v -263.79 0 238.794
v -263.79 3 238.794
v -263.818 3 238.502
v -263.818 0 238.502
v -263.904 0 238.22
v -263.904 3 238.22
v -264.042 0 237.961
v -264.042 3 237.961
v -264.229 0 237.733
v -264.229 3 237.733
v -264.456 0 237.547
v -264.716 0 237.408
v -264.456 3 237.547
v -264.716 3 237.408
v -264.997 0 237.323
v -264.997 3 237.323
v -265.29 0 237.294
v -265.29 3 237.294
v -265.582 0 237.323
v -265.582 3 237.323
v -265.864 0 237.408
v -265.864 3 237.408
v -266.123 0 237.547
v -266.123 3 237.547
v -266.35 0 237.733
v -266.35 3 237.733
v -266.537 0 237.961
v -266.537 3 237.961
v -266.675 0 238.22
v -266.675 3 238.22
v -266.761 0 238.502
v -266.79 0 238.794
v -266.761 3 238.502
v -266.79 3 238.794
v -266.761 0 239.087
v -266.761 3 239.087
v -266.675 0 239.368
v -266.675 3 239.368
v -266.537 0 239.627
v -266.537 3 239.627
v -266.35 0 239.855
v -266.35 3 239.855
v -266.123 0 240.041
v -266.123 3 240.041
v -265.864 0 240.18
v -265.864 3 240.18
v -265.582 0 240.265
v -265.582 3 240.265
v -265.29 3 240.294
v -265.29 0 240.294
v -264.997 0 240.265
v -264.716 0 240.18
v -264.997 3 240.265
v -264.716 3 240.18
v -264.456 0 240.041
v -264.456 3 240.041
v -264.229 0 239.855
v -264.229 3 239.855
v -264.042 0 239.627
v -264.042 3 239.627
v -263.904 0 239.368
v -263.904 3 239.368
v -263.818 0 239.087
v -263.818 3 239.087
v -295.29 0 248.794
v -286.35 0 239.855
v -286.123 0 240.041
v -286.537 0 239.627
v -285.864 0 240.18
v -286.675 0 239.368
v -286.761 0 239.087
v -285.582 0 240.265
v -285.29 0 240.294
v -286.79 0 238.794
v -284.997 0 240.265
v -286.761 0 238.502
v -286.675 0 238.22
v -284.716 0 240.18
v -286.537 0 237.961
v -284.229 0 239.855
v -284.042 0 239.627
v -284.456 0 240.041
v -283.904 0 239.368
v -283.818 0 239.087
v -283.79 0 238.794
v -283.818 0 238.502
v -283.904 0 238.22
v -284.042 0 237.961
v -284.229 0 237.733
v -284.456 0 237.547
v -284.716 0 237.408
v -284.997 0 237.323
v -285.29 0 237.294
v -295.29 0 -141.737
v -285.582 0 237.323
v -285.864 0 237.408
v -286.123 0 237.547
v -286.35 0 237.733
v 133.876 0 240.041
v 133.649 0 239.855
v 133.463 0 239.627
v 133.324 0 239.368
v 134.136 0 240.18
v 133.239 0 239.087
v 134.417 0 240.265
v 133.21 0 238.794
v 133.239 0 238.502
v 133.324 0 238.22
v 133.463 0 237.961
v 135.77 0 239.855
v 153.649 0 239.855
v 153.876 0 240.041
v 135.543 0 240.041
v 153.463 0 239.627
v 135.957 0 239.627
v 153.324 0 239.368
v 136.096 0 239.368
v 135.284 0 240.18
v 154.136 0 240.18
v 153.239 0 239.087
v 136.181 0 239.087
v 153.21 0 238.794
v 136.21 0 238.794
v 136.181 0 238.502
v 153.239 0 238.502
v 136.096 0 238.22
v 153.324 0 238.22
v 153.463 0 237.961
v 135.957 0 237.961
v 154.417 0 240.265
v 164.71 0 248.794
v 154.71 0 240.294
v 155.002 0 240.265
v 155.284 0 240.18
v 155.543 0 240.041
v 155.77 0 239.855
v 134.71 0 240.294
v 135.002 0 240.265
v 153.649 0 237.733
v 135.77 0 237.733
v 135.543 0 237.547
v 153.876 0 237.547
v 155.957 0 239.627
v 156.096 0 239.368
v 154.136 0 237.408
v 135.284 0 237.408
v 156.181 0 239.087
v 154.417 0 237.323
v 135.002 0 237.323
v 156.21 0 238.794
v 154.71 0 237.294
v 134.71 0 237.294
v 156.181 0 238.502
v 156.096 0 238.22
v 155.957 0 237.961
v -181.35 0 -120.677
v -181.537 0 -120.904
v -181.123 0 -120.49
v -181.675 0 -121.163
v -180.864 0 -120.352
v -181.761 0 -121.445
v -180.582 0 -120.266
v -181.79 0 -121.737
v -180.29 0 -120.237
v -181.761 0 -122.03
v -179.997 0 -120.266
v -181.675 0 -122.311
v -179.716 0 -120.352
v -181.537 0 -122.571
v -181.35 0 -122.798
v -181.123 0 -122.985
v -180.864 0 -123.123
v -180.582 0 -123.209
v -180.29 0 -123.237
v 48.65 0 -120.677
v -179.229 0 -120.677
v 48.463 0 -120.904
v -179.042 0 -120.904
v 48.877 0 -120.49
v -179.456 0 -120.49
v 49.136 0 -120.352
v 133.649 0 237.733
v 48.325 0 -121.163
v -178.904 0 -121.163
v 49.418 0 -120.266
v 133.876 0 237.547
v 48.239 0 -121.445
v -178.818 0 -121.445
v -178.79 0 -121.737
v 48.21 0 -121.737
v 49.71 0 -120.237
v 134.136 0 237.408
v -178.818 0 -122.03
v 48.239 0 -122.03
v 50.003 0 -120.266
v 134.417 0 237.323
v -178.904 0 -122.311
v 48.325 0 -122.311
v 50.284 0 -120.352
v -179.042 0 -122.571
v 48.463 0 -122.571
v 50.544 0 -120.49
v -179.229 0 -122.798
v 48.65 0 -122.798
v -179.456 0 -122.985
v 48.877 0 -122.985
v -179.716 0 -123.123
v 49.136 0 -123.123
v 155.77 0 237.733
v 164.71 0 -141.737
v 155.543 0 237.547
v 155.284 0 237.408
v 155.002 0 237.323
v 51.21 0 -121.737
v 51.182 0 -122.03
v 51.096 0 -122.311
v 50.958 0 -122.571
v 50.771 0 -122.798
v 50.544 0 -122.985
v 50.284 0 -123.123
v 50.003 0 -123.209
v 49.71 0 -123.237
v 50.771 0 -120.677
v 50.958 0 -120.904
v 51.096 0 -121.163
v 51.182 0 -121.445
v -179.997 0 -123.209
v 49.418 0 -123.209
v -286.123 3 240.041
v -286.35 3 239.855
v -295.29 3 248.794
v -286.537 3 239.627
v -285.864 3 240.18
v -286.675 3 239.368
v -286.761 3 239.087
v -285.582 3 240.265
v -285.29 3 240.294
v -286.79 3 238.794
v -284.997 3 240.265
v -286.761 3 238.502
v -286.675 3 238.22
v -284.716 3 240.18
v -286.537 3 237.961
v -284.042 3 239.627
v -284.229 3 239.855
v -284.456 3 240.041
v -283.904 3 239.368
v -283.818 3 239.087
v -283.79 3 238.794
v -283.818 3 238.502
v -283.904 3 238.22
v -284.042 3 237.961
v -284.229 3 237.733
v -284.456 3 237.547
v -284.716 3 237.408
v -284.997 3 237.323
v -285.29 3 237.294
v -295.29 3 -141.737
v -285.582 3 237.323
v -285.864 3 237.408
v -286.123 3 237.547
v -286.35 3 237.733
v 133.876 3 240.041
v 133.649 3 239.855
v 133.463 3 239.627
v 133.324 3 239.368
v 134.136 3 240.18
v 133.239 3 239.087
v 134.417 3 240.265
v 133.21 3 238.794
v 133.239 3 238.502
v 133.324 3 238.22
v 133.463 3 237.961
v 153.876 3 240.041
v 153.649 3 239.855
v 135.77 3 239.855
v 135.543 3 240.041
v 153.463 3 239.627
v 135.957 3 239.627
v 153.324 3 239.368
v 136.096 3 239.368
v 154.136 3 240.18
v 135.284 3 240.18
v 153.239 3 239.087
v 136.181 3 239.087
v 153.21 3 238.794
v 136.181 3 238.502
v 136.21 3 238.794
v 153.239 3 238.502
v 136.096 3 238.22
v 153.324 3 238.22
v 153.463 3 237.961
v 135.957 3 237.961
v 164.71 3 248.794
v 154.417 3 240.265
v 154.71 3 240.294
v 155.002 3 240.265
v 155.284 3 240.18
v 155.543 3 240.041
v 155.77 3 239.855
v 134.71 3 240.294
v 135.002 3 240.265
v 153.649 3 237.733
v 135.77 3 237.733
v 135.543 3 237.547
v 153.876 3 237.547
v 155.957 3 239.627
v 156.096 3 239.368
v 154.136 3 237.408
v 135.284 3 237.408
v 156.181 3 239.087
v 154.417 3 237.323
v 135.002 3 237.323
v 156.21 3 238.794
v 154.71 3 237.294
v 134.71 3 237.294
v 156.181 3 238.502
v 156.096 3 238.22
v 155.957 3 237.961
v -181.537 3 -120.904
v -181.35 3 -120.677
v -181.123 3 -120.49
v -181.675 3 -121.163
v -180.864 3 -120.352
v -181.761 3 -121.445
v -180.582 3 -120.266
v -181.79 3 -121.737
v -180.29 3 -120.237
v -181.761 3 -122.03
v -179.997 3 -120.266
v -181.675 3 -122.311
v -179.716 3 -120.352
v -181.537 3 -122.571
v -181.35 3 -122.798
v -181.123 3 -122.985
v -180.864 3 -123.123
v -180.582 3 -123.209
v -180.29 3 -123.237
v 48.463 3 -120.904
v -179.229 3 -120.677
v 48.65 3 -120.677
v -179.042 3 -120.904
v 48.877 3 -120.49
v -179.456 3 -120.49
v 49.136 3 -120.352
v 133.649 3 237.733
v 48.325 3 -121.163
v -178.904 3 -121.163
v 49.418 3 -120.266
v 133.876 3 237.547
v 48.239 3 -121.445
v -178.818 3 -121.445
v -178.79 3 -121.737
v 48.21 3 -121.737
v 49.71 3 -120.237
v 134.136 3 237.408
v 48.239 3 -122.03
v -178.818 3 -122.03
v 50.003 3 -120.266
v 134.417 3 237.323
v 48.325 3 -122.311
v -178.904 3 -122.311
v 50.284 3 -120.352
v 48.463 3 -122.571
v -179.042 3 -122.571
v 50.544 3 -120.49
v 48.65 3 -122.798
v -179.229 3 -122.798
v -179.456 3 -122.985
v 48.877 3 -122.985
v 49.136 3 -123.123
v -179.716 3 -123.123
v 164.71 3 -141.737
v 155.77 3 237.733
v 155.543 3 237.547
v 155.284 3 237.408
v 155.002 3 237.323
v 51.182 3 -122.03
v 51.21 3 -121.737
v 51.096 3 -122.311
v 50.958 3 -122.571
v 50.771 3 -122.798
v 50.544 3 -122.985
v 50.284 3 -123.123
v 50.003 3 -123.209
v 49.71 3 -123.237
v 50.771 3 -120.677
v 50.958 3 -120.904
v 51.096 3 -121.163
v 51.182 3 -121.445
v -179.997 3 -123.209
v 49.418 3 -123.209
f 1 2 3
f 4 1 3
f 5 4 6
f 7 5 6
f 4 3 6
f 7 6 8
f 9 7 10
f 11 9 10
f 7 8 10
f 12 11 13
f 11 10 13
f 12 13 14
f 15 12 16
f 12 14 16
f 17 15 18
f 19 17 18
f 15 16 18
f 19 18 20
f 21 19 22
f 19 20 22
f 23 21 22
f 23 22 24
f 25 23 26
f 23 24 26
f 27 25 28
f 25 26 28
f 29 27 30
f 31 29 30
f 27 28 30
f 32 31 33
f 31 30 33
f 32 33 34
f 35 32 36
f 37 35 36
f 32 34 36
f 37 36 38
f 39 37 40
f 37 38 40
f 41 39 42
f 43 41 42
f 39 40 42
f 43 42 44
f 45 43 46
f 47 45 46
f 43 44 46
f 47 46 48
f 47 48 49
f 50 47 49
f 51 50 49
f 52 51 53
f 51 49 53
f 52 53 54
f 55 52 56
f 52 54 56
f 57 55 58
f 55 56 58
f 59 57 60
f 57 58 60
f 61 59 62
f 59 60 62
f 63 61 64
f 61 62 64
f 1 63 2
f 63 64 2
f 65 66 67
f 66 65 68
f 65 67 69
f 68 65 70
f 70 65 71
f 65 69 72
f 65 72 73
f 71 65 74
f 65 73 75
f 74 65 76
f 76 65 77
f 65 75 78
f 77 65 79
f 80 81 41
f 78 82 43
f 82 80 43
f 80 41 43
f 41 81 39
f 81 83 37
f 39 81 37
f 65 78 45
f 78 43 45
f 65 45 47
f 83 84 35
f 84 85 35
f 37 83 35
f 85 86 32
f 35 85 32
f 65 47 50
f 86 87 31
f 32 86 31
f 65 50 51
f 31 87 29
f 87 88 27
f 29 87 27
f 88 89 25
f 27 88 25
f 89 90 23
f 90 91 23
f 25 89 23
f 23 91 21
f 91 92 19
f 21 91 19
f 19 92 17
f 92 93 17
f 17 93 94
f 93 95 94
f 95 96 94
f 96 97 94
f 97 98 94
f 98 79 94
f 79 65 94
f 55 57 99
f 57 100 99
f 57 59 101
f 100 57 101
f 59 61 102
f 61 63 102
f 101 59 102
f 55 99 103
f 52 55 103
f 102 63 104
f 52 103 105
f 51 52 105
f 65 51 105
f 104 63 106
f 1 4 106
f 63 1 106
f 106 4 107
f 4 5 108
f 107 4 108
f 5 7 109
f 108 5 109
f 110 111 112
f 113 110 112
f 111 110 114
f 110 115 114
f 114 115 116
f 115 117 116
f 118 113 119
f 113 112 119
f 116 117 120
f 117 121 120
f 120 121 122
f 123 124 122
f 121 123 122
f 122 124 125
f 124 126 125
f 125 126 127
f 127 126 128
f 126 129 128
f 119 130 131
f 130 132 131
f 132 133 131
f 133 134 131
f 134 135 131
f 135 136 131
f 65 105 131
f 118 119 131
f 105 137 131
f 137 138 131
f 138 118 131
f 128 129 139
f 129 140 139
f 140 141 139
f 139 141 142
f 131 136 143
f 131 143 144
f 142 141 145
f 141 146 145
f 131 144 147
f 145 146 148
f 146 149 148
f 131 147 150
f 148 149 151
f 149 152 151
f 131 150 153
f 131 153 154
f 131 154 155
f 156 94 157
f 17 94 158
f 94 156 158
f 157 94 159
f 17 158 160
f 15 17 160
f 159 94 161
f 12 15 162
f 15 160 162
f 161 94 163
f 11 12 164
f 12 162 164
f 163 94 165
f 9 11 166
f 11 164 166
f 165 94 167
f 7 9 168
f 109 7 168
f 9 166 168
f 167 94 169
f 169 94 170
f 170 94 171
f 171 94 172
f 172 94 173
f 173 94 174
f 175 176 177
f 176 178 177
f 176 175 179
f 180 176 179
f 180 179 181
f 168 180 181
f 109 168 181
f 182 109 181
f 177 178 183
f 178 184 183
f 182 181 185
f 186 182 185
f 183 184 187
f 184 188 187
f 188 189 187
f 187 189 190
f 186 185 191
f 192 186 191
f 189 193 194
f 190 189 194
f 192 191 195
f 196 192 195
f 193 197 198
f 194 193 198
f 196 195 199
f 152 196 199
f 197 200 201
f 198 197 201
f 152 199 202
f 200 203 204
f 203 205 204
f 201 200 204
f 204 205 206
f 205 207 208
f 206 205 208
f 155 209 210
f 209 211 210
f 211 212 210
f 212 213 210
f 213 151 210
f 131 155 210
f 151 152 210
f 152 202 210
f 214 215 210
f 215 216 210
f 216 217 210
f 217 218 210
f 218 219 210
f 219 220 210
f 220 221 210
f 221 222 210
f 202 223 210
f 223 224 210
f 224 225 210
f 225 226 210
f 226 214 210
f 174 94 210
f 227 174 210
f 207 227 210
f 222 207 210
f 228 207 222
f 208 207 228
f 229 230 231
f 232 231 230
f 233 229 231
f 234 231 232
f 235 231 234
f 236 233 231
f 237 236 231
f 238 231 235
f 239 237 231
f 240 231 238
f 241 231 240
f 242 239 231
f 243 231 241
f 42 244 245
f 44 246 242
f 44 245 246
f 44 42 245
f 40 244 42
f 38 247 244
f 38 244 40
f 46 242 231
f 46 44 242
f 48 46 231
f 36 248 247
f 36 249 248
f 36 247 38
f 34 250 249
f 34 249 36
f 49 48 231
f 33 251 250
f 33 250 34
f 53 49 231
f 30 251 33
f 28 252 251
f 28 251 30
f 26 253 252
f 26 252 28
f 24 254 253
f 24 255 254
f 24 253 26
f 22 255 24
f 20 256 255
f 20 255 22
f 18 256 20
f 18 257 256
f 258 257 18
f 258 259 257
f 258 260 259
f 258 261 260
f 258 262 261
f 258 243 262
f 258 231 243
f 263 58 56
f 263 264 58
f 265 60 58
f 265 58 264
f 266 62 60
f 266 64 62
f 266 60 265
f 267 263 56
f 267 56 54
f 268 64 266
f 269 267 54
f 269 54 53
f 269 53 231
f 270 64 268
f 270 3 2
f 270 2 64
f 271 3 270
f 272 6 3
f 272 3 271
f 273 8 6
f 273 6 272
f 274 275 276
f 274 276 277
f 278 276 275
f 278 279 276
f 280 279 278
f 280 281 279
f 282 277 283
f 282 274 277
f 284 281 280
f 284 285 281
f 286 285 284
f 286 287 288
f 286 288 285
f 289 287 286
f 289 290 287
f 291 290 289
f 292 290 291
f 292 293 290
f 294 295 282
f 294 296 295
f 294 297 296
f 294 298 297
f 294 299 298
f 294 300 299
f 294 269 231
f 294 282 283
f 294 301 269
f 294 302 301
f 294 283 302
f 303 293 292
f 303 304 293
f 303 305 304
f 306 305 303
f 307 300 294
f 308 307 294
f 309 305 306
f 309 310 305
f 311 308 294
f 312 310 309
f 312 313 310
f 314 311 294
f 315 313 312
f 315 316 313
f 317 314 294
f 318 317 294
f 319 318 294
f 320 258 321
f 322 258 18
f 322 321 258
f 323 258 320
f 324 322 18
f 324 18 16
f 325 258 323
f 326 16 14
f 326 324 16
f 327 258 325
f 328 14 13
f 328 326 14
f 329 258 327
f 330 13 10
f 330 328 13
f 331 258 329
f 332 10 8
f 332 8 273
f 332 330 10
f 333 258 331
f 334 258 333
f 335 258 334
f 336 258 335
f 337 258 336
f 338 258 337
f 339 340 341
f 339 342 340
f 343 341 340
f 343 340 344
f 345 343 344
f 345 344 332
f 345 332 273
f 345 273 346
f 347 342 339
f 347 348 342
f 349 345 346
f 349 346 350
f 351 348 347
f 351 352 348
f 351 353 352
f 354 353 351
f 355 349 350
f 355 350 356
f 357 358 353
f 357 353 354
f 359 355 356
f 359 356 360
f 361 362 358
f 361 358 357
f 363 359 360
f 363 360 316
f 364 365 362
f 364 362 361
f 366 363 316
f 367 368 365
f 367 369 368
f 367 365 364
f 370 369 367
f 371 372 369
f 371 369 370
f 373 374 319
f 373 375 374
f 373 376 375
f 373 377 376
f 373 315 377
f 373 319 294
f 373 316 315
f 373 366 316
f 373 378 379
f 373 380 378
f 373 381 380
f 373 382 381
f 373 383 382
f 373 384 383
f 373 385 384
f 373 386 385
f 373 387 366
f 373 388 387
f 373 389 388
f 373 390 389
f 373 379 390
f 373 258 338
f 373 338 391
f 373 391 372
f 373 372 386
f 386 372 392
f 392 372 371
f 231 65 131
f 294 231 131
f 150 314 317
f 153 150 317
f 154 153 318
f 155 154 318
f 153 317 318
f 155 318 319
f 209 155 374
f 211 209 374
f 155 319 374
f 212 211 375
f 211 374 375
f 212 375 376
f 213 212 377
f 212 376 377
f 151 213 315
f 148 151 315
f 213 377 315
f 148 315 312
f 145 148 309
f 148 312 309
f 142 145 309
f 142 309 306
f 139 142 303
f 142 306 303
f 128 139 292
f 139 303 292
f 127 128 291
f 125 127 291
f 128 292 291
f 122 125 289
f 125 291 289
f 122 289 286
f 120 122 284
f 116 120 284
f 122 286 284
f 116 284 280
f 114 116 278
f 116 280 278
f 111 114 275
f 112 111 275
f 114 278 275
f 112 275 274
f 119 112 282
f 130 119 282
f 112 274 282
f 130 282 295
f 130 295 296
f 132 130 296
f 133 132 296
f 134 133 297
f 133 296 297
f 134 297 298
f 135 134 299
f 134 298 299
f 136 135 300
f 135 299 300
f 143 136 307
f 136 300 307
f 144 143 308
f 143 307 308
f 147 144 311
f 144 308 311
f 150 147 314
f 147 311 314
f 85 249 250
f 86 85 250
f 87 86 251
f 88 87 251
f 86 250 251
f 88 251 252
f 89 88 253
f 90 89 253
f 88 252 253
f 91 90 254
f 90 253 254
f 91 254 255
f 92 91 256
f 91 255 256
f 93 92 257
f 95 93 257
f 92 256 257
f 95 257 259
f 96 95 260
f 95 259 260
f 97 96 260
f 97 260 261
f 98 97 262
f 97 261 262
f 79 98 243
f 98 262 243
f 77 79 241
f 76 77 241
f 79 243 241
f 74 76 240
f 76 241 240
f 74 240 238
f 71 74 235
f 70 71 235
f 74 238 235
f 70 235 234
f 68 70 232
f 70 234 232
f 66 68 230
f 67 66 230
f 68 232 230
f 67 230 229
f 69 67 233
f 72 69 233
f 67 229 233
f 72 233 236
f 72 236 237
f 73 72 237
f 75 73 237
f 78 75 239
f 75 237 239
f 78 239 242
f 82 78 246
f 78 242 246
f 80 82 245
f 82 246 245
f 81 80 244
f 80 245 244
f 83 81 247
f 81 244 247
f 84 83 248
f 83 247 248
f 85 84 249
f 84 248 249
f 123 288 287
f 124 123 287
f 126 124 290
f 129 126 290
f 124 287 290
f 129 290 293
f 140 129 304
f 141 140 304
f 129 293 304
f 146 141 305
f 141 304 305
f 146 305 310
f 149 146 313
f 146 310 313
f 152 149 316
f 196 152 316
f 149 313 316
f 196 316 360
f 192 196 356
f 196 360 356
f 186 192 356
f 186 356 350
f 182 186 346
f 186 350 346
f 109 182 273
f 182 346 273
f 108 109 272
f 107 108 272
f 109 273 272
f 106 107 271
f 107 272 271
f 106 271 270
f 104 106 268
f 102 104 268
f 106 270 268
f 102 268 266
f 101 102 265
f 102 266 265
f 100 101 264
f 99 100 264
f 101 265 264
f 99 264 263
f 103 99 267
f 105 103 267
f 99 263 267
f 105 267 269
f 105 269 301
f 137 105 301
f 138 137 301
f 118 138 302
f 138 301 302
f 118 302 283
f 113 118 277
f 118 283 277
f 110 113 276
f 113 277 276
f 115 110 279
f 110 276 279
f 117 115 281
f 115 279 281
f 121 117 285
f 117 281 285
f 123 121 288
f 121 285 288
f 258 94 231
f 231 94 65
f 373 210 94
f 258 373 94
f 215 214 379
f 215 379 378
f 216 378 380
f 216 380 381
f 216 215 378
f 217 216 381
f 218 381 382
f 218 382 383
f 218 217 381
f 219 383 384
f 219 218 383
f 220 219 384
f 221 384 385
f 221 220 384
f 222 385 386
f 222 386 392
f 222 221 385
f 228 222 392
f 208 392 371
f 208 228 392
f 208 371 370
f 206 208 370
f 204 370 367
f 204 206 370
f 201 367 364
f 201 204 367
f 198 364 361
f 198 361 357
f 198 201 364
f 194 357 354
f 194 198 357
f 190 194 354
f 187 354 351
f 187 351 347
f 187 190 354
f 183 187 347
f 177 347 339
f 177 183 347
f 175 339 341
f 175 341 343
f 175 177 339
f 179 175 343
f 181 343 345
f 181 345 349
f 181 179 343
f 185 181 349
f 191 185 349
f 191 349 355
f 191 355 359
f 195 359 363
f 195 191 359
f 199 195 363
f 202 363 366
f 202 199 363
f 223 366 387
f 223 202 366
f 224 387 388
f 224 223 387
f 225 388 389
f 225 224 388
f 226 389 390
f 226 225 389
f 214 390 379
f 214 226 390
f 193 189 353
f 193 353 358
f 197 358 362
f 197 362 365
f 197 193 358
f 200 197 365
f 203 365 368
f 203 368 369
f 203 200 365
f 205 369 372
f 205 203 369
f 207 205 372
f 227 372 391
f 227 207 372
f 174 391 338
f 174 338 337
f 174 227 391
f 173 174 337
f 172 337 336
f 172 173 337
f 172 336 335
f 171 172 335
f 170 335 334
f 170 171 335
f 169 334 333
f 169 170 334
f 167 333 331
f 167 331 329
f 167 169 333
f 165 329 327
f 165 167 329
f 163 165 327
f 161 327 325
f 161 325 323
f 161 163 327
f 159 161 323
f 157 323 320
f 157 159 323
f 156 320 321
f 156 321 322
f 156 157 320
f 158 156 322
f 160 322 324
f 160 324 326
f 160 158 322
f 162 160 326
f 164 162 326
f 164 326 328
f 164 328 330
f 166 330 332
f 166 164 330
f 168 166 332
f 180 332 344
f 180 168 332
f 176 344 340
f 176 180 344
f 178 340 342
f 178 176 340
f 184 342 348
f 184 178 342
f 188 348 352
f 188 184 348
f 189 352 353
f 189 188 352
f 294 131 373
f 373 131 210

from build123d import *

# Parameters (mm, degrees)
SKETCH3_R           = 1.5
BOSS_EXTRUDE2_DEPTH = 3
SKETCH4_R           = 1.5
CUT_EXTRUDE1_DEPTH  = 3


with BuildPart() as part:
    # Sketch3 → Boss-Extrude2 (new body)
    with BuildSketch(Plane(origin=(0, 0, 0), x_dir=(1, 0, 0), z_dir=(0, 1, 0))):
        Polygon((-190.289572375, 141.737381871), (-295.289572375, 141.737381871), (-295.289572375, -248.794136117), (164.709727779, -248.794136117), (164.709727779, 141.737381871), (59.710427625, 141.737381871), (39.710427625, 141.737381871), (-170.289572375, 141.737381871), align=None)
        with Locations((-180.289572375, 121.737381871)):
            Circle(SKETCH3_R, mode=Mode.SUBTRACT)
        with Locations((49.710427625, 121.737381871)):
            Circle(SKETCH3_R, mode=Mode.SUBTRACT)
    extrude(amount=BOSS_EXTRUDE2_DEPTH)

    # Sketch4 → Cut-Extrude1 (cut)
    with BuildSketch(Plane(origin=(0, 3, 0), x_dir=(1, 0, 0), z_dir=(0, 1, 0))):
        with Locations((134.709727779, -238.794136117)):
            Circle(SKETCH4_R)
        with Locations((154.709727779, -238.794136117)):
            Circle(SKETCH4_R)
        with Locations((-285.289572375, -238.794136117)):
            Circle(SKETCH4_R)
        with Locations((-265.289572375, -238.794136117)):
            Circle(SKETCH4_R)
    extrude(amount=-CUT_EXTRUDE1_DEPTH, mode=Mode.SUBTRACT)


solid = part.part
